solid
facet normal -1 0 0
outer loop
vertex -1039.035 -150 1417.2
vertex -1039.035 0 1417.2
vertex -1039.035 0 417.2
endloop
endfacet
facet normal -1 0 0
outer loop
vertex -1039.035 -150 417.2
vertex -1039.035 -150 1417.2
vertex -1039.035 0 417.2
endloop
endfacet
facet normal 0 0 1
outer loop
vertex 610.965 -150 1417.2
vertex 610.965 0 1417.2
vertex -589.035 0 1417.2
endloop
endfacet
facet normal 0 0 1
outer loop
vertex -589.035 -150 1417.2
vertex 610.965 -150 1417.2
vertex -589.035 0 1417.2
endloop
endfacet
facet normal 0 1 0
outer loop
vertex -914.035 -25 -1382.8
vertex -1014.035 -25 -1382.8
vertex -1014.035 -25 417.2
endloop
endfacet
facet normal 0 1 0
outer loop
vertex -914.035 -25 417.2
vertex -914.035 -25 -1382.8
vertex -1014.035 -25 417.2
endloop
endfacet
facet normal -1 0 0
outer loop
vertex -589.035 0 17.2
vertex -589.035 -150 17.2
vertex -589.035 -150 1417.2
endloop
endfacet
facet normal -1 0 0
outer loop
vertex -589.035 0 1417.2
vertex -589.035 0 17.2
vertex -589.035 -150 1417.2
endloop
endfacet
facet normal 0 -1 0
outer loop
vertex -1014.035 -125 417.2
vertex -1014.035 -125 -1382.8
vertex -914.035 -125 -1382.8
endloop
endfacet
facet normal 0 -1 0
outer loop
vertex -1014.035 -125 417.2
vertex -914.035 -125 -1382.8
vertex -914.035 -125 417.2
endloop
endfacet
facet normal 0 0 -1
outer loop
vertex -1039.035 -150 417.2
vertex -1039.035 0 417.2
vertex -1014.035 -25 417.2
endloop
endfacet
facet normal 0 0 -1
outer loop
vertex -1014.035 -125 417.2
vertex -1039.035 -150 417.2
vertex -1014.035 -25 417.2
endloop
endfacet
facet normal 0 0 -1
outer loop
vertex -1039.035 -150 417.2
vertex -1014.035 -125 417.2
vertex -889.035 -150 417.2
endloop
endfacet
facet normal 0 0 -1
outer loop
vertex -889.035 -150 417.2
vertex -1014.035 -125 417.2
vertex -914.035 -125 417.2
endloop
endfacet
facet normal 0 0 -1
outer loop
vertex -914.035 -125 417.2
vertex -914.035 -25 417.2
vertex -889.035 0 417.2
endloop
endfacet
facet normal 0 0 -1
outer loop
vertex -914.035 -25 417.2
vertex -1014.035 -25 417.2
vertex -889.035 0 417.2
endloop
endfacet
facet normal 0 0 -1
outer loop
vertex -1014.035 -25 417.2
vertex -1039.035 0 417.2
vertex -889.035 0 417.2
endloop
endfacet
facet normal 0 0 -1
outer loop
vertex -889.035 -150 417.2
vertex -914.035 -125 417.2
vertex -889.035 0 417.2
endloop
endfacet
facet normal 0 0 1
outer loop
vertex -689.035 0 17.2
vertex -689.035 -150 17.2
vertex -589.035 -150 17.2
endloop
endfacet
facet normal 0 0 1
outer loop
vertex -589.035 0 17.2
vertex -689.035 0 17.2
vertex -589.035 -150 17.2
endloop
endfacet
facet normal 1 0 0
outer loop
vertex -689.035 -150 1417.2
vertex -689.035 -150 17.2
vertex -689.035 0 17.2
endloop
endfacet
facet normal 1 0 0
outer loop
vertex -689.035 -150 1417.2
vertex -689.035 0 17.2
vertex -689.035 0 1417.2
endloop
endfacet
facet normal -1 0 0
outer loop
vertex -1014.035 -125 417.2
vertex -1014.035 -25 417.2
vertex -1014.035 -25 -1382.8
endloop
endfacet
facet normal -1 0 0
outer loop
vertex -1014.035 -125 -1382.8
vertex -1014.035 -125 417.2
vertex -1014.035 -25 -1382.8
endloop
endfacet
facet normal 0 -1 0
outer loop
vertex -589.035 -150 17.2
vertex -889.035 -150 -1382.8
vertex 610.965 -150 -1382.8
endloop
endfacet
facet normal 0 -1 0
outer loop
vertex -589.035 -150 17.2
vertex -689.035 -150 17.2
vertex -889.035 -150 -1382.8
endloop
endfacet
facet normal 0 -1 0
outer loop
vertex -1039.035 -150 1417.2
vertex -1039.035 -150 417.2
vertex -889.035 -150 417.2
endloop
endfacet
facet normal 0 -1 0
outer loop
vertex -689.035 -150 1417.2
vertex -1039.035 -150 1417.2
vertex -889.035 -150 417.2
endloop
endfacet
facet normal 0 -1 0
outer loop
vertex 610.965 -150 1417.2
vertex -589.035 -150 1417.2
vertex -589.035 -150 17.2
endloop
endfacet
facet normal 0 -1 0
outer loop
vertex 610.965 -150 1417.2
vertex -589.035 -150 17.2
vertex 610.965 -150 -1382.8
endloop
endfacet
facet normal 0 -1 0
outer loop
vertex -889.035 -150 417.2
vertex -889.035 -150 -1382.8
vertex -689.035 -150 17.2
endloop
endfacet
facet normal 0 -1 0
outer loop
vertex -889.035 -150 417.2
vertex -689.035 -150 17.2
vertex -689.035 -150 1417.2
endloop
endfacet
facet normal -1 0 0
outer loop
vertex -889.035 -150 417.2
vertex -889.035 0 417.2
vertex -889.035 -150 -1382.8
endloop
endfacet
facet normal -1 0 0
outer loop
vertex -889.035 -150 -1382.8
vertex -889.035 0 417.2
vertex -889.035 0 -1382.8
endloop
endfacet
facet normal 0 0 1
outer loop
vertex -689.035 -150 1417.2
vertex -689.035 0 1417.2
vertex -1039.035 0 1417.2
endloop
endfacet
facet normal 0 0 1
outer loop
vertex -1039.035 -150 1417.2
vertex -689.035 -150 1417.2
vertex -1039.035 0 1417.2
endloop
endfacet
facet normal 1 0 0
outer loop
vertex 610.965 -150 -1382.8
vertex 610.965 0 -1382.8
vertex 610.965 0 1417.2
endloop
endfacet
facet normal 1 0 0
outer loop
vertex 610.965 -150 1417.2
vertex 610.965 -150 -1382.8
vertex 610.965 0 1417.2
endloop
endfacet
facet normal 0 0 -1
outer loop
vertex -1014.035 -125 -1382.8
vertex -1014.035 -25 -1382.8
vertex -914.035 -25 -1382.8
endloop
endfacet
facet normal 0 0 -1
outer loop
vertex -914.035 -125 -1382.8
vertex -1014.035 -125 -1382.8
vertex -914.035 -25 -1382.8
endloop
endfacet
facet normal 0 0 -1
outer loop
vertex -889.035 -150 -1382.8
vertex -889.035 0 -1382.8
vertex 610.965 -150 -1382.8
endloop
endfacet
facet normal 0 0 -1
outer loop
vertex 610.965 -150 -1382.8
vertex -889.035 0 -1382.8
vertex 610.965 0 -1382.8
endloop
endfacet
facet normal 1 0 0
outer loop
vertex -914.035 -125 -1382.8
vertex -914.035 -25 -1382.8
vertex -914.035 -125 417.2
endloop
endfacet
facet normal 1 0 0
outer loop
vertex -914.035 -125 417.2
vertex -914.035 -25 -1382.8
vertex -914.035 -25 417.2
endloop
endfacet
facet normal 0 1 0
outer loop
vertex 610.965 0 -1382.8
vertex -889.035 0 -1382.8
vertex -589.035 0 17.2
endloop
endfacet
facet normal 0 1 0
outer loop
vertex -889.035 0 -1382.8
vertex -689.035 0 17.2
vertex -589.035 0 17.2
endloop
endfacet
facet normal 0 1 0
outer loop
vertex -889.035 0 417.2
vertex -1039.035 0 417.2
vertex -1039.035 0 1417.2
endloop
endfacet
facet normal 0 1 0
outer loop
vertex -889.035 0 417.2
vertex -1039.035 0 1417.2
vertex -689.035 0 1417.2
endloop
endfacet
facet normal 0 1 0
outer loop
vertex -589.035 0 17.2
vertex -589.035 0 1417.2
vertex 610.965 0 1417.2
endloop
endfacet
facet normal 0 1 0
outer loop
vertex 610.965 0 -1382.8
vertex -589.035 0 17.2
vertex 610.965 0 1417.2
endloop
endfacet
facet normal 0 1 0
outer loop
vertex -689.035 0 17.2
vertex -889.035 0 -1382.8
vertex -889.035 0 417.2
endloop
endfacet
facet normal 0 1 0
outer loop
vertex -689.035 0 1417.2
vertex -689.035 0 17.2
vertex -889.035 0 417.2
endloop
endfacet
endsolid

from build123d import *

# Parameters (mm, degrees)
F1_DEPTH = 150
F2_W     = 25
F2_H     = 1800
F3_DEPTH = 100
F4_W     = 100
F4_H     = 1400
F5_DEPTH = 150


with BuildPart() as f1:
    # F0 (on Front) → F1 (new body)
    with BuildSketch(Plane.XZ):
        Polygon((-889.035082, 417.200029), (-889.035082, -1382.799971), (610.964918, -1382.799971), (610.964918, 1417.200029), (-1039.035082, 1417.200029), (-1039.035082, 417.200029), (-1014.035082, 417.200029), (-1014.035082, -1382.799971), (-914.035082, -1382.799971), (-914.035082, 417.200029), align=None)
    extrude(amount=F1_DEPTH)

    # F2 (on face) → F3 (cut, through all)
    with BuildSketch(Plane(origin=(-1014.035082, 0, 0), x_dir=(0, -1, 0), z_dir=(-1, 0, 0))):
        with Locations((137.5, -482.799971)):
            Rectangle(F2_W, F2_H)
        with Locations((12.5, -482.799971)):
            Rectangle(F2_W, F2_H)
    extrude(amount=-F3_DEPTH, mode=Mode.SUBTRACT)

    # F4 (on face) → F5 (cut, through all)
    with BuildSketch(Plane.XZ.offset(150)):
        with Locations((-639.035082, 717.200029)):
            Rectangle(F4_W, F4_H)
    extrude(amount=-F5_DEPTH, mode=Mode.SUBTRACT)


solid = f1.part
